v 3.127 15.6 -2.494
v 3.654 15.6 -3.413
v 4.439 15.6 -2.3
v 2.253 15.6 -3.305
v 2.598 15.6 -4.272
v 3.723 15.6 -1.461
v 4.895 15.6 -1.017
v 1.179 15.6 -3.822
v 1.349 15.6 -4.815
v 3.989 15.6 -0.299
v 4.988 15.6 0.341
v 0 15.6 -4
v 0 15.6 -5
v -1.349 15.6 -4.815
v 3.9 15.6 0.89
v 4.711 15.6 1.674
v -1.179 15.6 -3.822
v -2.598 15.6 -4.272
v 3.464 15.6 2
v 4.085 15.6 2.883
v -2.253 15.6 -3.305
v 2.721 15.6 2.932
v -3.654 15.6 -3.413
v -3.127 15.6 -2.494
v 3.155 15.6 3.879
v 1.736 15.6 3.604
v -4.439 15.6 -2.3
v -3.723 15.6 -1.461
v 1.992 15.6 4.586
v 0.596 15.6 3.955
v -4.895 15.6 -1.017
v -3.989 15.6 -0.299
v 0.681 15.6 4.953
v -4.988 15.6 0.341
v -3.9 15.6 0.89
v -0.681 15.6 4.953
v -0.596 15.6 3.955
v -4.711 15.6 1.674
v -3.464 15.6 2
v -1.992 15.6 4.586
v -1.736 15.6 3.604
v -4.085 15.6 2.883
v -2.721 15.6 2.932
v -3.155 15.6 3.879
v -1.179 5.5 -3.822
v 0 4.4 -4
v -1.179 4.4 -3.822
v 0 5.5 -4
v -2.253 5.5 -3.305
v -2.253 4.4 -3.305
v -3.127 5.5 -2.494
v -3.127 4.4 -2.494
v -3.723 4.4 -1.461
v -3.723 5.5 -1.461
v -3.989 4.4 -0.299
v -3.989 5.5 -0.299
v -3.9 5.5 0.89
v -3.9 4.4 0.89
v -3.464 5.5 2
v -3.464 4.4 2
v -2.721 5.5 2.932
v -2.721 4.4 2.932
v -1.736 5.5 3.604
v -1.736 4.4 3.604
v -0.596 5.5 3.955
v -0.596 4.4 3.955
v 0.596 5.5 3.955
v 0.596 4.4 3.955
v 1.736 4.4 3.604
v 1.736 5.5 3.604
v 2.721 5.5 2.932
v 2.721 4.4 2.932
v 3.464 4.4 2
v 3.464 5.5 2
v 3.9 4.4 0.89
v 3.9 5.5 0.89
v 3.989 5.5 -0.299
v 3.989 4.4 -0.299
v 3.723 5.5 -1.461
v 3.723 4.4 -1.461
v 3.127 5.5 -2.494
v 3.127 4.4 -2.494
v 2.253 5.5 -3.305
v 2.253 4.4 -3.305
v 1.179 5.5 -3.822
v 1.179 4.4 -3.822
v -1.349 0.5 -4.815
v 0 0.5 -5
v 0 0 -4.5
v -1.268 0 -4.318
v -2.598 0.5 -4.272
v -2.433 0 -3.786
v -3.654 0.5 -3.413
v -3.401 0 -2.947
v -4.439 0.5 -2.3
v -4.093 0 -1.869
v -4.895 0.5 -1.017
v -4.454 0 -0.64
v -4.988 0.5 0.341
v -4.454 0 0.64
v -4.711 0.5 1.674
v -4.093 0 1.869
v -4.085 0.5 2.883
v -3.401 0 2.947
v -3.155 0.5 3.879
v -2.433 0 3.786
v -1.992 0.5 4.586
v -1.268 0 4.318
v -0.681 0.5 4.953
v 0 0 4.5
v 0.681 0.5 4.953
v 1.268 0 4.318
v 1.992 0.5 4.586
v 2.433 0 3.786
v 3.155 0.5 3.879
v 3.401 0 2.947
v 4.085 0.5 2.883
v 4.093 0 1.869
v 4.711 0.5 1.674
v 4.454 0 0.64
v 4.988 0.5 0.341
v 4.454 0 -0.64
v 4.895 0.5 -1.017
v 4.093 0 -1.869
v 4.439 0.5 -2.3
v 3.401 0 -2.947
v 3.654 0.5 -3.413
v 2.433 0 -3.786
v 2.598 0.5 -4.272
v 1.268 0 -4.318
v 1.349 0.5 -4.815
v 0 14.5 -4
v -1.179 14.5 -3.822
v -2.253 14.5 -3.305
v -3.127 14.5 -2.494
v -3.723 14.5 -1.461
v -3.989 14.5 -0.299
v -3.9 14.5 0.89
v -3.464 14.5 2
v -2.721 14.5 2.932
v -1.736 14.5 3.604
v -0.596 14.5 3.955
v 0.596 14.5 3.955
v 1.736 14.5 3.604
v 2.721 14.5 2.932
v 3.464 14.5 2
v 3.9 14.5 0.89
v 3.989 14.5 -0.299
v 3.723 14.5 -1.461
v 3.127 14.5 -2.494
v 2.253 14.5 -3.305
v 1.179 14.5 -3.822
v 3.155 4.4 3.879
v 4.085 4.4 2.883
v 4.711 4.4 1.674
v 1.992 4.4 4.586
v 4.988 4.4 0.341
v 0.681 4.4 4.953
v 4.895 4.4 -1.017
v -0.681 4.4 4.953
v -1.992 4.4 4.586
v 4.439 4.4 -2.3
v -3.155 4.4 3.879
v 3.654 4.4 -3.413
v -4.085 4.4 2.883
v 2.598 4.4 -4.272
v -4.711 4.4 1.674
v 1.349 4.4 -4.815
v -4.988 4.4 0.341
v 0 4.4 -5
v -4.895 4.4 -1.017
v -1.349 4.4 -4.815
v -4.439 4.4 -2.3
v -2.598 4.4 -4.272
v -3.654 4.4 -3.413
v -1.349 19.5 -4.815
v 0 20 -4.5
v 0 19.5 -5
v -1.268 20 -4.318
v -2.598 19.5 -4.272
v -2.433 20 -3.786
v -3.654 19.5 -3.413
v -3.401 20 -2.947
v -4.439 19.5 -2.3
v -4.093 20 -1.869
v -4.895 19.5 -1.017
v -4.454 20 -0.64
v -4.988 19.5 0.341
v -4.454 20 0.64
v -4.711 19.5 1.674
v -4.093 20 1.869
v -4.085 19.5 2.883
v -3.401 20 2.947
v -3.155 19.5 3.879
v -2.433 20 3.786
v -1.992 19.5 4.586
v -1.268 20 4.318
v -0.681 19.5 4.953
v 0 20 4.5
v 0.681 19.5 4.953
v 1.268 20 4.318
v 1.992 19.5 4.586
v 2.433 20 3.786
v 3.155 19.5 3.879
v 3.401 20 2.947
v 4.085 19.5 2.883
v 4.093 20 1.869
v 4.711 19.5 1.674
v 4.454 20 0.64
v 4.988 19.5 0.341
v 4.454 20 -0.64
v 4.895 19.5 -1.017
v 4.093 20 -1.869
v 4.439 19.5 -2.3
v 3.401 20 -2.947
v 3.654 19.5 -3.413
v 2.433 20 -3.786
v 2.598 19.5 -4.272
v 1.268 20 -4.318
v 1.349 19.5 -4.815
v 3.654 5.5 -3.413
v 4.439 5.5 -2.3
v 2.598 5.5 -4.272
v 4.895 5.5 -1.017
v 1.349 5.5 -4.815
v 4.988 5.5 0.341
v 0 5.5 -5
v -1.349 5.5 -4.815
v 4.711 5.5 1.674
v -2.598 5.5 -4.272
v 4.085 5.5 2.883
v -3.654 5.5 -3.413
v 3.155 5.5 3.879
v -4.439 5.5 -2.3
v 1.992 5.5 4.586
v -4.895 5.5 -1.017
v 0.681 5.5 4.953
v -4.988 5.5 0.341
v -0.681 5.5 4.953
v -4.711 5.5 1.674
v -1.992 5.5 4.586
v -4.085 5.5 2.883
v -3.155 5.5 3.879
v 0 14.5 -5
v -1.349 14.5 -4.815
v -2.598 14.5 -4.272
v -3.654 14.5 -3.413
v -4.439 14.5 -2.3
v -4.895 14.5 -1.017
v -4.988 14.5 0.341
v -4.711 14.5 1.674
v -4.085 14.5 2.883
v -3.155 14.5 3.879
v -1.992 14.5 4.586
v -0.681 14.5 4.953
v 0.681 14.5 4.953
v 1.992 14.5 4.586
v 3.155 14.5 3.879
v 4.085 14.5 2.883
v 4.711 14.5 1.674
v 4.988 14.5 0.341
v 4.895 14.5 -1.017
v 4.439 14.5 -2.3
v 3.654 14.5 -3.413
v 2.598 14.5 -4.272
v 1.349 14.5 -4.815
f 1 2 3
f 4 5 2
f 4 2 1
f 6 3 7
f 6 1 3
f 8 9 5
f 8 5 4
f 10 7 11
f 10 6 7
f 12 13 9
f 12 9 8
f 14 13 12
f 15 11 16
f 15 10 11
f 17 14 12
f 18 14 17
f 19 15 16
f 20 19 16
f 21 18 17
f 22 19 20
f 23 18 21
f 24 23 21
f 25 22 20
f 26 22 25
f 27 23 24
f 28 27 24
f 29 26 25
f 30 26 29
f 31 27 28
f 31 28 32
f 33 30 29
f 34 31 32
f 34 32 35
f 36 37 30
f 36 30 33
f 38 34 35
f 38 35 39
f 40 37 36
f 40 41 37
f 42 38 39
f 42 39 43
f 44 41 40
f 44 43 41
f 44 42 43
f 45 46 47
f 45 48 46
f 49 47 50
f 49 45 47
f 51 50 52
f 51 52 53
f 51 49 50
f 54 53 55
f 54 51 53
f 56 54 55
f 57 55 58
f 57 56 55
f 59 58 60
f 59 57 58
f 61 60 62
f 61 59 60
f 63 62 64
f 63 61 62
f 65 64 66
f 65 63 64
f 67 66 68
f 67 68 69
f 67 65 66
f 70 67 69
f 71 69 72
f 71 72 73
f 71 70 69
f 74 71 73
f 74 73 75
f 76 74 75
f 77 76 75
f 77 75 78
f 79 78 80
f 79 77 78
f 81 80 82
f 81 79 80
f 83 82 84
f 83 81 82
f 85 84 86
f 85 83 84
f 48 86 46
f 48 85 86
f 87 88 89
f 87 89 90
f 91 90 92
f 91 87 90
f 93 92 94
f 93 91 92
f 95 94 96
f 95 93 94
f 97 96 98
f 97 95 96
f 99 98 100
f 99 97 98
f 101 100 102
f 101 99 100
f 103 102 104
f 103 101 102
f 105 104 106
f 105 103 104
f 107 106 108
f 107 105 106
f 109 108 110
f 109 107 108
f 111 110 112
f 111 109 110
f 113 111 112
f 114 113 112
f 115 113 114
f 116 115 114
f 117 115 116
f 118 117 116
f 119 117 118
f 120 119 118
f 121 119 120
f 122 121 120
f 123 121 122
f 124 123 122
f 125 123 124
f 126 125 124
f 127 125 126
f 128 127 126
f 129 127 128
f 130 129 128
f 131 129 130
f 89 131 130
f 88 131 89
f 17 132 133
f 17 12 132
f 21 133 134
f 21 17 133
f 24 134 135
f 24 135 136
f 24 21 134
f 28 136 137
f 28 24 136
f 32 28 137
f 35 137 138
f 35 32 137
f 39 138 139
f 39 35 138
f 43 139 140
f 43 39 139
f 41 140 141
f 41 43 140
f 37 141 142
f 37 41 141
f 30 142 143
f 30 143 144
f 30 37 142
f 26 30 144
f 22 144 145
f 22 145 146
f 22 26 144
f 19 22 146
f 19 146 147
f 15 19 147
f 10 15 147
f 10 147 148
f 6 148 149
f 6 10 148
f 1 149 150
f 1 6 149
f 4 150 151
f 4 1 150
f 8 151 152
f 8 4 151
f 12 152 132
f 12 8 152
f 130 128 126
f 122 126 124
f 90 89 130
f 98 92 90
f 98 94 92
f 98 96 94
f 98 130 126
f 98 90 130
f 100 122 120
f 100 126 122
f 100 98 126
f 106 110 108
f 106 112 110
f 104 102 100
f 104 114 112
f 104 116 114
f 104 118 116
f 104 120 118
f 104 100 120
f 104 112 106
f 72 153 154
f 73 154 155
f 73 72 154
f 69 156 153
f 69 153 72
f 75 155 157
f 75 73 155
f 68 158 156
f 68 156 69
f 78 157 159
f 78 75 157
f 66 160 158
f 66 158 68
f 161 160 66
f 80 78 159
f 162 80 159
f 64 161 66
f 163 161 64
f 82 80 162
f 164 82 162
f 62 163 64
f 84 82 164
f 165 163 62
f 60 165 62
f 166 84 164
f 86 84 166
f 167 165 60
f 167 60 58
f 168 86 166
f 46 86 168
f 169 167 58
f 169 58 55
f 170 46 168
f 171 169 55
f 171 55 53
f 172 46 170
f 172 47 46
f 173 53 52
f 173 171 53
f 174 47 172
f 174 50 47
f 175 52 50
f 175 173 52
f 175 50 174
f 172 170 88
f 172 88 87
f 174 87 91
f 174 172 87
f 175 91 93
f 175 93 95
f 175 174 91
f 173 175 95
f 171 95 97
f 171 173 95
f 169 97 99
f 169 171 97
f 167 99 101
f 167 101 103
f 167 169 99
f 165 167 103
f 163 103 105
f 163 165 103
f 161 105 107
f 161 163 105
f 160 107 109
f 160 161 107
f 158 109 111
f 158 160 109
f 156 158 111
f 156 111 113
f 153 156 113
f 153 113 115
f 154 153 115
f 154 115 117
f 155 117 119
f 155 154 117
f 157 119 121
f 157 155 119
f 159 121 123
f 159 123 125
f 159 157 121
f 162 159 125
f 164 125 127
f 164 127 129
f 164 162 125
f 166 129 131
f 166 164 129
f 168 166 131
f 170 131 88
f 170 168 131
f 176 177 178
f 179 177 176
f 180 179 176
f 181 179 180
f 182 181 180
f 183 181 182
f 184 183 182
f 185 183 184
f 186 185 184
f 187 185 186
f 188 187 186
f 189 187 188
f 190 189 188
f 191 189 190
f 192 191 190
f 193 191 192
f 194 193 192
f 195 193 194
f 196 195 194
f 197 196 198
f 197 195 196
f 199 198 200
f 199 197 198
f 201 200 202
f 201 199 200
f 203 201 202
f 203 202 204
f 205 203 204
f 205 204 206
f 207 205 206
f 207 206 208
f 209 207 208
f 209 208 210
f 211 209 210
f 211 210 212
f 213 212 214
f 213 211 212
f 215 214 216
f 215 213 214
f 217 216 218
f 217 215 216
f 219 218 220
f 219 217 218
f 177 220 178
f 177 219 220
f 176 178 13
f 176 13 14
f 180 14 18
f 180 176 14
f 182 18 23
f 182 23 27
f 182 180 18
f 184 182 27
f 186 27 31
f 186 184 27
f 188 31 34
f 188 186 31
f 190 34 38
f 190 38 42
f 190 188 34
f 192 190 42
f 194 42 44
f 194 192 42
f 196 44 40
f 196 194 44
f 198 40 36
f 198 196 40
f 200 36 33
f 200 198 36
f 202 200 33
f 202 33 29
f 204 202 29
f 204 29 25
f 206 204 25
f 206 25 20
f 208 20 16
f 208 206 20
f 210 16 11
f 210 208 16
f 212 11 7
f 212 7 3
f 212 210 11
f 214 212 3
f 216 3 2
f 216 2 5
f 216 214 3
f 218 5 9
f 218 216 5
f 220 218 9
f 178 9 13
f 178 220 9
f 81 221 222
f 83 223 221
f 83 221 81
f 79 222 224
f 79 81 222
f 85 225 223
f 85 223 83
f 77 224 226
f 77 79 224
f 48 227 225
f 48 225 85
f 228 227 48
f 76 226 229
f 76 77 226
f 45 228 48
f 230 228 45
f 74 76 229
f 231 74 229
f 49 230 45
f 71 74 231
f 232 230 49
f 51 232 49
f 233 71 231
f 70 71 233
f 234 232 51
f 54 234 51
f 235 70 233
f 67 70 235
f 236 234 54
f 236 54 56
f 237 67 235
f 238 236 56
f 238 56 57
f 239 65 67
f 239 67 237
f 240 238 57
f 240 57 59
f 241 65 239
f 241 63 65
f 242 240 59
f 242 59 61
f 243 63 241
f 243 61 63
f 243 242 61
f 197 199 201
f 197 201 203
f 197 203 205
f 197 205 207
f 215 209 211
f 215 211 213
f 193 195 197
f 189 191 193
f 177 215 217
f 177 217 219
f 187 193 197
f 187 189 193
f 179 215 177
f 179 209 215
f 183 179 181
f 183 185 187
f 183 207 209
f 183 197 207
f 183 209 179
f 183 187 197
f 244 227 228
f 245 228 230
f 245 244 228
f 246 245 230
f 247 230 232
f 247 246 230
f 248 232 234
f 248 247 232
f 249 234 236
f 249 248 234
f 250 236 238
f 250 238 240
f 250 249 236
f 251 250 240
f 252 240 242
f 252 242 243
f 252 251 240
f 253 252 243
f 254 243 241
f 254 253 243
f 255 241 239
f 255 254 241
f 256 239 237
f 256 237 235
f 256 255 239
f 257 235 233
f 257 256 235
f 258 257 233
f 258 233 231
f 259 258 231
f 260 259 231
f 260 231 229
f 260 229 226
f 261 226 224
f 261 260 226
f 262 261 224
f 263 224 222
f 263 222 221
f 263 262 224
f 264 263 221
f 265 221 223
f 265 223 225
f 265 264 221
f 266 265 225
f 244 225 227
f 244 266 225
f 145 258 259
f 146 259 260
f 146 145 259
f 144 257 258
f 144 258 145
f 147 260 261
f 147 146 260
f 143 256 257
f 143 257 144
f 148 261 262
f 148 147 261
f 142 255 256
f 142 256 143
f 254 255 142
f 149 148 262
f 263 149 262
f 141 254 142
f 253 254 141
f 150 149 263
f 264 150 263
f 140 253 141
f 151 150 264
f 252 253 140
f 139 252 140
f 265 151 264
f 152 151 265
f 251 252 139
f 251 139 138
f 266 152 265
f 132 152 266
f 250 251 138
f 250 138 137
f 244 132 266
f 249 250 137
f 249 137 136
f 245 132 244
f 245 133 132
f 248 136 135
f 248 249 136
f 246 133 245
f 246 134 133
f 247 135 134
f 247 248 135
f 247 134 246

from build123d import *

# Parameters (mm, degrees)
FASE1_SIZE = 0.5


with BuildPart() as part:
    # Skizze1 → Rotation1 (revolve)
    with BuildSketch(Plane.XY, mode=Mode.PRIVATE) as rotation1_sk:
        Polygon((5, 5.5), (5, 14.5), (4, 14.5), (4, 15.6), (5, 15.6), (5, 20), (0, 20), (0, 0), (5, 0), (5, 4.4), (4, 4.4), (4, 5.5), align=None)
    revolve(rotation1_sk.sketch.rotate(Axis((0, 0, 0), (0, 1, 0)), 90), axis=Axis((0, 0, 0), (0, 1, 0)))

    # Fase1
    fase1_edges = [part.edges().sort_by_distance(p)[0] for p in [
        (0, 20, 5),
        (0, 0, 5),
    ]]
    chamfer(fase1_edges, length=FASE1_SIZE)


solid = part.part
